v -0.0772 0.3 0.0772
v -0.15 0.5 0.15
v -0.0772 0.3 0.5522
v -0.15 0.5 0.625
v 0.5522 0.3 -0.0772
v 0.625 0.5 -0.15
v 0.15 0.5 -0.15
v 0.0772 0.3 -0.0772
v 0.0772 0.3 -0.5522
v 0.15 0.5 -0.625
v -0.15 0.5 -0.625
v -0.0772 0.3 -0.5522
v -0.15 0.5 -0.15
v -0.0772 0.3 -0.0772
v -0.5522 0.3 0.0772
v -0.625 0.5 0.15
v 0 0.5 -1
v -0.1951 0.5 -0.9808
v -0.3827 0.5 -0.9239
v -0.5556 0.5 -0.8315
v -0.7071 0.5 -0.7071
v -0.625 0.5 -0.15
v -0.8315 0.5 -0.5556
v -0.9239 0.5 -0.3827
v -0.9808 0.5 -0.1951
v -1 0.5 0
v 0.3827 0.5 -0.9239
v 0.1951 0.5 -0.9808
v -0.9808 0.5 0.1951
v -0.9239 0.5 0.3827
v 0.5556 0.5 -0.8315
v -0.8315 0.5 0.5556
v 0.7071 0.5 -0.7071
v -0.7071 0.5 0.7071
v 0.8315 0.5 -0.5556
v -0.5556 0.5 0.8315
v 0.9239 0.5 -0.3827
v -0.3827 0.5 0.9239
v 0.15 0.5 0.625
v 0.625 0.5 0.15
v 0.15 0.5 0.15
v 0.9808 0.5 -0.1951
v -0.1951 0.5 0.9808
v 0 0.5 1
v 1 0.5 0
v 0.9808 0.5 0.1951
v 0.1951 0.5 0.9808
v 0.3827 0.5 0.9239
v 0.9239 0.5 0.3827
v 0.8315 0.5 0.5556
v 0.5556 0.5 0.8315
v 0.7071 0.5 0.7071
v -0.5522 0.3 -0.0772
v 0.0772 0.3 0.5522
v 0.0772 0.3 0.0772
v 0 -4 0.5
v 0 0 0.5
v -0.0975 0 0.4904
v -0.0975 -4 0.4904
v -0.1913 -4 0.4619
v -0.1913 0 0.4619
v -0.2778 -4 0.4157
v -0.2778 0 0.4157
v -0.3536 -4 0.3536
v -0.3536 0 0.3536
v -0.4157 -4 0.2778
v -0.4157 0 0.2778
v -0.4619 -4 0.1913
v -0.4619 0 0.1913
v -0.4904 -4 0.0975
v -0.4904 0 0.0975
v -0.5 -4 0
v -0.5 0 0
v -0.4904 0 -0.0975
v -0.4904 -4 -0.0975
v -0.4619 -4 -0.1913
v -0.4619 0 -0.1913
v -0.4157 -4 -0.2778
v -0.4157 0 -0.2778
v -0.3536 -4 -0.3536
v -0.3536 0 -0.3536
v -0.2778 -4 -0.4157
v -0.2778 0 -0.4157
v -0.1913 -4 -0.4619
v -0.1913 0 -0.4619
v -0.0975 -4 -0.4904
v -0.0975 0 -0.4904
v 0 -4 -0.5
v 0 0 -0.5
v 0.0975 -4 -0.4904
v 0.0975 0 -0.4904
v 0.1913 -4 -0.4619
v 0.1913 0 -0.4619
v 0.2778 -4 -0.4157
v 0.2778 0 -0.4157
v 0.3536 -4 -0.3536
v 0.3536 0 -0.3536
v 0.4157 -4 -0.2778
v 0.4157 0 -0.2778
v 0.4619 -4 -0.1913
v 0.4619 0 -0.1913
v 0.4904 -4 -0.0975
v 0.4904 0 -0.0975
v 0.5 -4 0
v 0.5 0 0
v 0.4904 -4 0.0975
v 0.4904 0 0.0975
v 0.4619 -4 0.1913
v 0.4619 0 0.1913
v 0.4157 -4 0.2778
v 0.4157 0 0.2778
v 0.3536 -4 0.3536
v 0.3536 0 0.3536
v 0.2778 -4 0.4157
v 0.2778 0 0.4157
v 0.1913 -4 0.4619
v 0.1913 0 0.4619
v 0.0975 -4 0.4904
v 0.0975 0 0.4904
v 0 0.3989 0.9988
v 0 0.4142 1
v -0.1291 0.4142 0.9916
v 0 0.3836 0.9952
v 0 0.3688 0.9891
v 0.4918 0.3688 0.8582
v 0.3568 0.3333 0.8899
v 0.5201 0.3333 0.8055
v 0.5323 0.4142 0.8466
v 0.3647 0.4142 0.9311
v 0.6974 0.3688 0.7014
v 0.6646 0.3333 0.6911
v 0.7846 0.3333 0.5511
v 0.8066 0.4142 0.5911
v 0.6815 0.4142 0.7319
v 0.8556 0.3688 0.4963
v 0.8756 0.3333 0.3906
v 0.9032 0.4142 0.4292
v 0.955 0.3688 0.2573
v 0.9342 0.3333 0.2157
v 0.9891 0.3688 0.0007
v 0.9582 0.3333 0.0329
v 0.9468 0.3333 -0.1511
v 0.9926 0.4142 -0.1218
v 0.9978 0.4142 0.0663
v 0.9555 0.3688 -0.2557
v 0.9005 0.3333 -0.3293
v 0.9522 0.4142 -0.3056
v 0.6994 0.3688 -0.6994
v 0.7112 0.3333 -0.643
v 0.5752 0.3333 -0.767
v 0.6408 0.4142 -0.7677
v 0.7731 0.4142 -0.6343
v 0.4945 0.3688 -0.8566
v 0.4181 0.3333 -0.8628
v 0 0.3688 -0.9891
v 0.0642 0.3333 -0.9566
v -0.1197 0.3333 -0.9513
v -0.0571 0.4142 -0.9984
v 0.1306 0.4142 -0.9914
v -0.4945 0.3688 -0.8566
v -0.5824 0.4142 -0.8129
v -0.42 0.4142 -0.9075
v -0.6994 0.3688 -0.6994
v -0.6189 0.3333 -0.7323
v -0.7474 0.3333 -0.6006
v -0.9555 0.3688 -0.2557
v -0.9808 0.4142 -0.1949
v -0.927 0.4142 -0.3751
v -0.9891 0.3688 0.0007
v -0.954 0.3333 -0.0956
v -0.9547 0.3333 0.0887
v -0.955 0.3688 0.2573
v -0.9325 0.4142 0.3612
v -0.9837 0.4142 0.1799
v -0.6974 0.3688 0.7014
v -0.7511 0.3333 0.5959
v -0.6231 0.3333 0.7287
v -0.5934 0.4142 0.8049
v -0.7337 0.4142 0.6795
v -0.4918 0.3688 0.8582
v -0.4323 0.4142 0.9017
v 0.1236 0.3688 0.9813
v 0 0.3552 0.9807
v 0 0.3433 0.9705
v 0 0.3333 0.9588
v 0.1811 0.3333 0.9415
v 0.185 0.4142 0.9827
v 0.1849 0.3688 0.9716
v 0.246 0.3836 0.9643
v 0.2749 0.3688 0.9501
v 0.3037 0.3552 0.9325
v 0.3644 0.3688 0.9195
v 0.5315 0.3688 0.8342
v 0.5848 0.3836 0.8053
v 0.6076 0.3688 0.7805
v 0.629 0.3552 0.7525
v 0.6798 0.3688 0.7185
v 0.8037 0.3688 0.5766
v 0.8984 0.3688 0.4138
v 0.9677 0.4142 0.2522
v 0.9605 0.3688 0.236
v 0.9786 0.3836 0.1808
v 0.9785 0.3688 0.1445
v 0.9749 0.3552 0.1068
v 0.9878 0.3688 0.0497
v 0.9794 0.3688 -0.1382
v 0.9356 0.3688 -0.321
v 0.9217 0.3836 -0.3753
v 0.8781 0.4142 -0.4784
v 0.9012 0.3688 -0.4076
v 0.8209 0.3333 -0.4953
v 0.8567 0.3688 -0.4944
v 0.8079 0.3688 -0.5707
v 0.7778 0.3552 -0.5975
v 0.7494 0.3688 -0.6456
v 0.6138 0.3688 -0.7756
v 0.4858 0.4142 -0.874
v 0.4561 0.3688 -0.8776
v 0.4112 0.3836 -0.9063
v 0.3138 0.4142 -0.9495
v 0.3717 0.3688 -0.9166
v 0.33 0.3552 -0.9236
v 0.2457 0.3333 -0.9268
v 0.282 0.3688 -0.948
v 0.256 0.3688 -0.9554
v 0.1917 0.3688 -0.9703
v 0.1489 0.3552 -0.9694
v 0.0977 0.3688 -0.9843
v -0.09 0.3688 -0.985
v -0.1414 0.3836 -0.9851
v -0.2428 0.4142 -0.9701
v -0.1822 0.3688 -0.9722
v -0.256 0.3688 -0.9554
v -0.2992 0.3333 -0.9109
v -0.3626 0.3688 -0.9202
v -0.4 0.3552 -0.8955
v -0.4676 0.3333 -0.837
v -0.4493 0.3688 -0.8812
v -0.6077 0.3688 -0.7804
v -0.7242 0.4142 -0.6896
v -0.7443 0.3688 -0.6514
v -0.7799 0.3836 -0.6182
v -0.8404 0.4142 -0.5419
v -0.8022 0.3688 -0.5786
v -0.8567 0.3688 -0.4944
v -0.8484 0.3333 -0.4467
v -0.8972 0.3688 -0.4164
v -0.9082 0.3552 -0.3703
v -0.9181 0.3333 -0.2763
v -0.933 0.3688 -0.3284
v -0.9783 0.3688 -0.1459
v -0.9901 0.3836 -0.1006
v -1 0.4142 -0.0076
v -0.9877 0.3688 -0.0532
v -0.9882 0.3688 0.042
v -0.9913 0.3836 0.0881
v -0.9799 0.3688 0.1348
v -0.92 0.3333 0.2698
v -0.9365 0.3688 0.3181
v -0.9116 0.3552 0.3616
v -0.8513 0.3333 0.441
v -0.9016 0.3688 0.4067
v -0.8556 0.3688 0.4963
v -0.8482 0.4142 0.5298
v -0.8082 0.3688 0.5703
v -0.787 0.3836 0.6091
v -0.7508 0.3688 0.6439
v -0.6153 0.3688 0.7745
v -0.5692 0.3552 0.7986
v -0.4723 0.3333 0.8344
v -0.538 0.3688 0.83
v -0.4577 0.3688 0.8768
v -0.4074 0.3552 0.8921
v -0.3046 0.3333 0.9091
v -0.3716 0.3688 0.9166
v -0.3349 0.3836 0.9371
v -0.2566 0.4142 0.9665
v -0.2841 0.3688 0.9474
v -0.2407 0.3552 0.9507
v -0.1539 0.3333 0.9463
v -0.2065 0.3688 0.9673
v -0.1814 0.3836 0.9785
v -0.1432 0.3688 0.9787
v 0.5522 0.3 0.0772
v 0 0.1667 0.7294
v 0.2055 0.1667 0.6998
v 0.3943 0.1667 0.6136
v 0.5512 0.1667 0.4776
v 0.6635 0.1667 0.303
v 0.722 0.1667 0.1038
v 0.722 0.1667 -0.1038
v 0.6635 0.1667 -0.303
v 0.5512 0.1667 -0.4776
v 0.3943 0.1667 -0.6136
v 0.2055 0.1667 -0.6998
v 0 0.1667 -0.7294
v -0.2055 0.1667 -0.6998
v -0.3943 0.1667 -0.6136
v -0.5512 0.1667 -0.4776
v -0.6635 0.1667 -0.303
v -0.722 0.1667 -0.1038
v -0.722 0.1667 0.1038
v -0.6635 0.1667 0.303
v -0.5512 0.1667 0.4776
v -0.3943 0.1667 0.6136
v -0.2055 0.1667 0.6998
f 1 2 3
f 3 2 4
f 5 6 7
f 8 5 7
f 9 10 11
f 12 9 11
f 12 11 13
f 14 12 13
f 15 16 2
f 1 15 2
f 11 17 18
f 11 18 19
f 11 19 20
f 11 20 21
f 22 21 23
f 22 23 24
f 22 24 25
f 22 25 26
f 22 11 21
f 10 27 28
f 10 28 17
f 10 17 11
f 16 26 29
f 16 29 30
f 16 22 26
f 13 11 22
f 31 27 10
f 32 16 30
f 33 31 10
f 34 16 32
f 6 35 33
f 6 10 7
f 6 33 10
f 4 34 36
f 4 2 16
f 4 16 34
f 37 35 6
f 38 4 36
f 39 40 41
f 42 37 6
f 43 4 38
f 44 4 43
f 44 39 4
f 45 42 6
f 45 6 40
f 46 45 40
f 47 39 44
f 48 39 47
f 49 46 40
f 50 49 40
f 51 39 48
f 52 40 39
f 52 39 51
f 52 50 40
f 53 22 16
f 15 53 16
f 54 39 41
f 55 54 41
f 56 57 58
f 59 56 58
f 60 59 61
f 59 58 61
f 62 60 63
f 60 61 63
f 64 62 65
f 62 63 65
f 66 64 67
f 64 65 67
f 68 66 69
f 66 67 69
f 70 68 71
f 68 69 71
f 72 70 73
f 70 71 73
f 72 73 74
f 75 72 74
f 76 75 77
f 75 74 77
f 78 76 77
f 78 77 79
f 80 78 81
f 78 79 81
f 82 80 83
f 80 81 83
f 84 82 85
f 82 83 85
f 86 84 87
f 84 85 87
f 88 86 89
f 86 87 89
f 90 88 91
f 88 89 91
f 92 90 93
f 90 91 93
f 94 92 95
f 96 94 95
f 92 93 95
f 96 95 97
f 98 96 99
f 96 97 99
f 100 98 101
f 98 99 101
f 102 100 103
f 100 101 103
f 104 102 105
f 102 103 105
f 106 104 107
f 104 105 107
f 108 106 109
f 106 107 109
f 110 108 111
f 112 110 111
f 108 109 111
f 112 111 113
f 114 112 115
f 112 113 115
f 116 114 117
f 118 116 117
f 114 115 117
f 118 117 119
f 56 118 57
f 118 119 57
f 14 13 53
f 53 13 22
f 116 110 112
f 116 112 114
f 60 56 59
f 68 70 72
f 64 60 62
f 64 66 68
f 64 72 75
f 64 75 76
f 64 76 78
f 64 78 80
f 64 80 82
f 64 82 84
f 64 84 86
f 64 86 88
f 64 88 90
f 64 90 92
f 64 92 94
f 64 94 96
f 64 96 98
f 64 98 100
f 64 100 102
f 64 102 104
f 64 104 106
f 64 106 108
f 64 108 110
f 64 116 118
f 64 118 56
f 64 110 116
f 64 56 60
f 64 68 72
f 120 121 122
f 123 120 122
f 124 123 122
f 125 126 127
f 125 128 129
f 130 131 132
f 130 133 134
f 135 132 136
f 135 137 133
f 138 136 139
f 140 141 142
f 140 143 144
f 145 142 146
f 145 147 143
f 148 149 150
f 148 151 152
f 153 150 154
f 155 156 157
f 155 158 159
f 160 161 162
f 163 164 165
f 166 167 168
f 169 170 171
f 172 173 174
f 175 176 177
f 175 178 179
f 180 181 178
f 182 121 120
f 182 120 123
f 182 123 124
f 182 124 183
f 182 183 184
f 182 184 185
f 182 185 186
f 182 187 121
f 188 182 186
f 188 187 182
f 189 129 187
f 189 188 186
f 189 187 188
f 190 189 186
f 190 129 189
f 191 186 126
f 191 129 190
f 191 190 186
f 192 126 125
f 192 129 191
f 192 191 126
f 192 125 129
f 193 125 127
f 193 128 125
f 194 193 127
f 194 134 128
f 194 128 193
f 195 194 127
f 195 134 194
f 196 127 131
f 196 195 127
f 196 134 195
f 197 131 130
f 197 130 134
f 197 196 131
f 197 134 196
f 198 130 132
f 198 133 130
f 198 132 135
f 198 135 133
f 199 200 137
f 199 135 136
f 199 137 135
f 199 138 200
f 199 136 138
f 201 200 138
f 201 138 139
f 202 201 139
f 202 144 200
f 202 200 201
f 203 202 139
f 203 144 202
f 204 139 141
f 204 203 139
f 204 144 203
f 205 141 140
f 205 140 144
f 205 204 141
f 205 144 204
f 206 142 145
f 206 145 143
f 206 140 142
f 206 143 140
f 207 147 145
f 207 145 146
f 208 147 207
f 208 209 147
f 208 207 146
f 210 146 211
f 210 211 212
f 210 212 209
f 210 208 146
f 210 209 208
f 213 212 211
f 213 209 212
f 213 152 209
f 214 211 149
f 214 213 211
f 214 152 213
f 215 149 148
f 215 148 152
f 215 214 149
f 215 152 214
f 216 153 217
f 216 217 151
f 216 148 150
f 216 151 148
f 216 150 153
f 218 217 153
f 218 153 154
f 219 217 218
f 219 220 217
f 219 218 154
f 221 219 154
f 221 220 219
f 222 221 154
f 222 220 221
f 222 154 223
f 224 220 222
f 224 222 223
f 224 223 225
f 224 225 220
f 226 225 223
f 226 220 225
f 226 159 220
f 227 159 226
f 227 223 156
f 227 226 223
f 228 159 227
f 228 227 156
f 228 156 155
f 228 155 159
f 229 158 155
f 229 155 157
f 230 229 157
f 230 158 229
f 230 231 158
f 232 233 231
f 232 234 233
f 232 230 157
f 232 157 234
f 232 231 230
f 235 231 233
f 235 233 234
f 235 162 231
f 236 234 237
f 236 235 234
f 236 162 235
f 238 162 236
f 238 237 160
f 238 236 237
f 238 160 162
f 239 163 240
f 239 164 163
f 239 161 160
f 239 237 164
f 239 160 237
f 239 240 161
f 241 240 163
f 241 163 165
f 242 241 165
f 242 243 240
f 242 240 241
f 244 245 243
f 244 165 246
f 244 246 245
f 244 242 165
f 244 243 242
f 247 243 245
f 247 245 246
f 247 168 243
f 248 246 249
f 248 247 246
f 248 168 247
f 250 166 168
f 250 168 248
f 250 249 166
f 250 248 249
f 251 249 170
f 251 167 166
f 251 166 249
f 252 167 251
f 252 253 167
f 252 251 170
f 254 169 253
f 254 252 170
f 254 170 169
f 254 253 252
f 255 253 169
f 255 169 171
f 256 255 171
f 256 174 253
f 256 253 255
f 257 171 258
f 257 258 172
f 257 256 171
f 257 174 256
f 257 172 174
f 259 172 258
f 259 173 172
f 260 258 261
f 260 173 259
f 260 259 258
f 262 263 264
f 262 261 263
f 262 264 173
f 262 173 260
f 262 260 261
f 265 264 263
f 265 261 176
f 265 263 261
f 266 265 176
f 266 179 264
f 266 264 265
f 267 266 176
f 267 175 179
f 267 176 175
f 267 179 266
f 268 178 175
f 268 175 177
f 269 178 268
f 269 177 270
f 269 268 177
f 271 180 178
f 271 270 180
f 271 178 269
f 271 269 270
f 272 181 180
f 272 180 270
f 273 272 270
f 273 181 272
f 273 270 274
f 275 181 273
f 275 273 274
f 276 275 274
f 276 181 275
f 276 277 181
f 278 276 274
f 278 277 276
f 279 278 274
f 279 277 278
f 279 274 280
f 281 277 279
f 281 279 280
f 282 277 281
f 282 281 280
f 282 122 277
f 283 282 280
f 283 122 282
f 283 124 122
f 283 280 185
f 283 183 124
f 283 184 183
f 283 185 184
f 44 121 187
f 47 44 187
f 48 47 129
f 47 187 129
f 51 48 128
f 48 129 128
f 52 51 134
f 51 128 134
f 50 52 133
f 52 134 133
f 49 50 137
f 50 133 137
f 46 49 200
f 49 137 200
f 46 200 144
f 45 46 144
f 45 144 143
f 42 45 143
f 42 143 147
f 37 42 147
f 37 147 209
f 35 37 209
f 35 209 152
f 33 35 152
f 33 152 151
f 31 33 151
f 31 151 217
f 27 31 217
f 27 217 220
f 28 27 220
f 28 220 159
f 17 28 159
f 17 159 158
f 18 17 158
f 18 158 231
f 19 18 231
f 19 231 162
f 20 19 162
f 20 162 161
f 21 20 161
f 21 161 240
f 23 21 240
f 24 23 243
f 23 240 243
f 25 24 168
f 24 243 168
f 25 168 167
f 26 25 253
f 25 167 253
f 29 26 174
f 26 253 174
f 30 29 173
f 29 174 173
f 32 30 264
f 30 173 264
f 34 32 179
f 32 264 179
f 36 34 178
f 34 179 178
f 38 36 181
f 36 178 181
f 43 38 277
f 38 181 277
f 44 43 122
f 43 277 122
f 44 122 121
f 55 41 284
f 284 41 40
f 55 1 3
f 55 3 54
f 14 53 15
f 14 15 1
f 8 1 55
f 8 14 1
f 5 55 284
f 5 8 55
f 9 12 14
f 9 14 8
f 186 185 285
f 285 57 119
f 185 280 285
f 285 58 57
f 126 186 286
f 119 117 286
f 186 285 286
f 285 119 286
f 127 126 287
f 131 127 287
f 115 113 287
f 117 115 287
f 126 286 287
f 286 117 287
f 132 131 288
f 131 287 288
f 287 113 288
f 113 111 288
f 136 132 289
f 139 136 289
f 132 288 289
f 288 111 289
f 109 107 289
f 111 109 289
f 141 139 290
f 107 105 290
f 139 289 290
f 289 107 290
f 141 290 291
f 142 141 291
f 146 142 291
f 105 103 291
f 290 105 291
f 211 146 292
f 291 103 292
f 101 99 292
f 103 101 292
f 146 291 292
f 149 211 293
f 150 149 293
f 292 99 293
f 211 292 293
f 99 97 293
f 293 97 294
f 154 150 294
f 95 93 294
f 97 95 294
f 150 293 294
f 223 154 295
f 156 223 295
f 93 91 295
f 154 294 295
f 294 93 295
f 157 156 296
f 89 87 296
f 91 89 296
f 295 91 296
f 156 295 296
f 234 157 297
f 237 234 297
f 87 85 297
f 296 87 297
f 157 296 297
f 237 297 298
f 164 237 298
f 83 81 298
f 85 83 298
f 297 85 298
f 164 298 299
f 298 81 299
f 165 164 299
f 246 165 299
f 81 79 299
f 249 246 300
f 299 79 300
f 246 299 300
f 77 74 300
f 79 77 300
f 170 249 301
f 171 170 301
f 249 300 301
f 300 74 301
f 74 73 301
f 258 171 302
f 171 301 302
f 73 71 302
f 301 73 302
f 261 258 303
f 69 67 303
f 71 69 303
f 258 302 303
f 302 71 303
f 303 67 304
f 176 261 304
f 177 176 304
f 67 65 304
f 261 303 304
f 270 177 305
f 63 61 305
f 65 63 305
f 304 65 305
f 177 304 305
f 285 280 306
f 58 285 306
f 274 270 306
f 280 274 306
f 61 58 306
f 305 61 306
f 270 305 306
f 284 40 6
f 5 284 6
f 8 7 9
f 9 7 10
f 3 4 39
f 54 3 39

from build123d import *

# Parameters (mm, degrees)
SKETCH1_R           = 1
BOSS_EXTRUDE1_DEPTH = 0.5
CUT_EXTRUDE1_DEPTH  = 0.2
CUT_EXTRUDE1_DRAFT  = -20
SKETCH3_R           = 0.5
BOSS_EXTRUDE2_DEPTH = 4
CHAMFER1_SIZE       = 0.363271264
CHAMFER1_SIZE_2     = 0.5
FILLET1_R           = 0.1


with BuildPart() as part:
    # Sketch1 → Boss-Extrude1 (new body)
    with BuildSketch(Plane(origin=(0, 0, 0), x_dir=(1, 0, 0), z_dir=(0, 1, 0))):
        with Locations(Location((0, 0, 0), (0, 0, 270))):
            Circle(SKETCH1_R)
    extrude(amount=BOSS_EXTRUDE1_DEPTH)


with BuildPart() as cut_extrude1_tool:
    # Sketch2 → Cut-Extrude1 (with draft: the straight prism first)
    with BuildSketch(Plane(origin=(0, 0.5, 0), x_dir=(1, 0, 0), z_dir=(0, 1, 0))):
        Polygon((-0.15, 0.625), (-0.15, 0.15), (-0.625, 0.15), (-0.625, -0.15), (-0.15, -0.15), (-0.15, -0.625), (0.15, -0.625), (0.15, -0.15), (0.625, -0.15), (0.625, 0.15), (0.15, 0.15), (0.15, 0.625), align=None)
    extrude(amount=-CUT_EXTRUDE1_DEPTH)
    # Cut-Extrude1: the draft: its side faces are tilted about the plane it starts from
    cut_extrude1_sides = [cut_extrude1_tool.faces().sort_by_distance(p)[0] for p in [
        (-0.15, 0.4, -0.3875),
        (-0.3875, 0.4, -0.15),
        (-0.625, 0.4, 0),
        (-0.3875, 0.4, 0.15),
        (-0.15, 0.4, 0.3875),
        (0, 0.4, 0.625),
        (0.15, 0.4, 0.3875),
        (0.3875, 0.4, 0.15),
        (0.625, 0.4, 0),
        (0.3875, 0.4, -0.15),
        (0.15, 0.4, -0.3875),
        (0, 0.4, -0.625),
    ]]
    draft(cut_extrude1_sides, Plane(origin=(0, 0.5, 0), x_dir=(1, 0, 0), z_dir=(0, 1, 0)), CUT_EXTRUDE1_DRAFT)


with BuildPart() as part_1:
    add(part.part)

    # Cut-Extrude1: cut by cut_extrude1_tool
    add(cut_extrude1_tool.part, mode=Mode.SUBTRACT)

    # Sketch3 → Boss-Extrude2 (add)
    with BuildSketch(Plane.XZ):
        with Locations(Location((0, 0, 0), (0, 0, 90))):
            Circle(SKETCH3_R)
    extrude(amount=BOSS_EXTRUDE2_DEPTH)

    # Chamfer1
    # the kernel refuses this chamfer: 0.5, 0.363271264 mm, written as the material it takes off along each edge
    with BuildSketch(Plane(origin=(0, 0, 0), x_dir=(0, 0, 1), z_dir=(-1, 0, 0))) as chamfer1_piece_1_section:
        Polygon((1, CHAMFER1_SIZE), (1 - CHAMFER1_SIZE_2, 0), (1, 0), align=None)
    chamfer1_piece_1 = revolve(axis=Axis((0, 0, 0), (0, 1, 0)), mode=Mode.PRIVATE)
    chamfer1_piece_1 = chamfer1_piece_1 - Plane(origin=(0, 0.180960424, 0), x_dir=(0, 0, 1), z_dir=(0, 1, 0)) * Cylinder(0.5, 4, mode=Mode.PRIVATE)
    add(chamfer1_piece_1, mode=Mode.SUBTRACT)

    # Fillet1
    fillet1_edges = [part_1.edges().sort_by_distance(p)[0] for p in [
        (0, 0.363271264, -1),
    ]]
    fillet(fillet1_edges, radius=FILLET1_R)


solid = part_1.part
